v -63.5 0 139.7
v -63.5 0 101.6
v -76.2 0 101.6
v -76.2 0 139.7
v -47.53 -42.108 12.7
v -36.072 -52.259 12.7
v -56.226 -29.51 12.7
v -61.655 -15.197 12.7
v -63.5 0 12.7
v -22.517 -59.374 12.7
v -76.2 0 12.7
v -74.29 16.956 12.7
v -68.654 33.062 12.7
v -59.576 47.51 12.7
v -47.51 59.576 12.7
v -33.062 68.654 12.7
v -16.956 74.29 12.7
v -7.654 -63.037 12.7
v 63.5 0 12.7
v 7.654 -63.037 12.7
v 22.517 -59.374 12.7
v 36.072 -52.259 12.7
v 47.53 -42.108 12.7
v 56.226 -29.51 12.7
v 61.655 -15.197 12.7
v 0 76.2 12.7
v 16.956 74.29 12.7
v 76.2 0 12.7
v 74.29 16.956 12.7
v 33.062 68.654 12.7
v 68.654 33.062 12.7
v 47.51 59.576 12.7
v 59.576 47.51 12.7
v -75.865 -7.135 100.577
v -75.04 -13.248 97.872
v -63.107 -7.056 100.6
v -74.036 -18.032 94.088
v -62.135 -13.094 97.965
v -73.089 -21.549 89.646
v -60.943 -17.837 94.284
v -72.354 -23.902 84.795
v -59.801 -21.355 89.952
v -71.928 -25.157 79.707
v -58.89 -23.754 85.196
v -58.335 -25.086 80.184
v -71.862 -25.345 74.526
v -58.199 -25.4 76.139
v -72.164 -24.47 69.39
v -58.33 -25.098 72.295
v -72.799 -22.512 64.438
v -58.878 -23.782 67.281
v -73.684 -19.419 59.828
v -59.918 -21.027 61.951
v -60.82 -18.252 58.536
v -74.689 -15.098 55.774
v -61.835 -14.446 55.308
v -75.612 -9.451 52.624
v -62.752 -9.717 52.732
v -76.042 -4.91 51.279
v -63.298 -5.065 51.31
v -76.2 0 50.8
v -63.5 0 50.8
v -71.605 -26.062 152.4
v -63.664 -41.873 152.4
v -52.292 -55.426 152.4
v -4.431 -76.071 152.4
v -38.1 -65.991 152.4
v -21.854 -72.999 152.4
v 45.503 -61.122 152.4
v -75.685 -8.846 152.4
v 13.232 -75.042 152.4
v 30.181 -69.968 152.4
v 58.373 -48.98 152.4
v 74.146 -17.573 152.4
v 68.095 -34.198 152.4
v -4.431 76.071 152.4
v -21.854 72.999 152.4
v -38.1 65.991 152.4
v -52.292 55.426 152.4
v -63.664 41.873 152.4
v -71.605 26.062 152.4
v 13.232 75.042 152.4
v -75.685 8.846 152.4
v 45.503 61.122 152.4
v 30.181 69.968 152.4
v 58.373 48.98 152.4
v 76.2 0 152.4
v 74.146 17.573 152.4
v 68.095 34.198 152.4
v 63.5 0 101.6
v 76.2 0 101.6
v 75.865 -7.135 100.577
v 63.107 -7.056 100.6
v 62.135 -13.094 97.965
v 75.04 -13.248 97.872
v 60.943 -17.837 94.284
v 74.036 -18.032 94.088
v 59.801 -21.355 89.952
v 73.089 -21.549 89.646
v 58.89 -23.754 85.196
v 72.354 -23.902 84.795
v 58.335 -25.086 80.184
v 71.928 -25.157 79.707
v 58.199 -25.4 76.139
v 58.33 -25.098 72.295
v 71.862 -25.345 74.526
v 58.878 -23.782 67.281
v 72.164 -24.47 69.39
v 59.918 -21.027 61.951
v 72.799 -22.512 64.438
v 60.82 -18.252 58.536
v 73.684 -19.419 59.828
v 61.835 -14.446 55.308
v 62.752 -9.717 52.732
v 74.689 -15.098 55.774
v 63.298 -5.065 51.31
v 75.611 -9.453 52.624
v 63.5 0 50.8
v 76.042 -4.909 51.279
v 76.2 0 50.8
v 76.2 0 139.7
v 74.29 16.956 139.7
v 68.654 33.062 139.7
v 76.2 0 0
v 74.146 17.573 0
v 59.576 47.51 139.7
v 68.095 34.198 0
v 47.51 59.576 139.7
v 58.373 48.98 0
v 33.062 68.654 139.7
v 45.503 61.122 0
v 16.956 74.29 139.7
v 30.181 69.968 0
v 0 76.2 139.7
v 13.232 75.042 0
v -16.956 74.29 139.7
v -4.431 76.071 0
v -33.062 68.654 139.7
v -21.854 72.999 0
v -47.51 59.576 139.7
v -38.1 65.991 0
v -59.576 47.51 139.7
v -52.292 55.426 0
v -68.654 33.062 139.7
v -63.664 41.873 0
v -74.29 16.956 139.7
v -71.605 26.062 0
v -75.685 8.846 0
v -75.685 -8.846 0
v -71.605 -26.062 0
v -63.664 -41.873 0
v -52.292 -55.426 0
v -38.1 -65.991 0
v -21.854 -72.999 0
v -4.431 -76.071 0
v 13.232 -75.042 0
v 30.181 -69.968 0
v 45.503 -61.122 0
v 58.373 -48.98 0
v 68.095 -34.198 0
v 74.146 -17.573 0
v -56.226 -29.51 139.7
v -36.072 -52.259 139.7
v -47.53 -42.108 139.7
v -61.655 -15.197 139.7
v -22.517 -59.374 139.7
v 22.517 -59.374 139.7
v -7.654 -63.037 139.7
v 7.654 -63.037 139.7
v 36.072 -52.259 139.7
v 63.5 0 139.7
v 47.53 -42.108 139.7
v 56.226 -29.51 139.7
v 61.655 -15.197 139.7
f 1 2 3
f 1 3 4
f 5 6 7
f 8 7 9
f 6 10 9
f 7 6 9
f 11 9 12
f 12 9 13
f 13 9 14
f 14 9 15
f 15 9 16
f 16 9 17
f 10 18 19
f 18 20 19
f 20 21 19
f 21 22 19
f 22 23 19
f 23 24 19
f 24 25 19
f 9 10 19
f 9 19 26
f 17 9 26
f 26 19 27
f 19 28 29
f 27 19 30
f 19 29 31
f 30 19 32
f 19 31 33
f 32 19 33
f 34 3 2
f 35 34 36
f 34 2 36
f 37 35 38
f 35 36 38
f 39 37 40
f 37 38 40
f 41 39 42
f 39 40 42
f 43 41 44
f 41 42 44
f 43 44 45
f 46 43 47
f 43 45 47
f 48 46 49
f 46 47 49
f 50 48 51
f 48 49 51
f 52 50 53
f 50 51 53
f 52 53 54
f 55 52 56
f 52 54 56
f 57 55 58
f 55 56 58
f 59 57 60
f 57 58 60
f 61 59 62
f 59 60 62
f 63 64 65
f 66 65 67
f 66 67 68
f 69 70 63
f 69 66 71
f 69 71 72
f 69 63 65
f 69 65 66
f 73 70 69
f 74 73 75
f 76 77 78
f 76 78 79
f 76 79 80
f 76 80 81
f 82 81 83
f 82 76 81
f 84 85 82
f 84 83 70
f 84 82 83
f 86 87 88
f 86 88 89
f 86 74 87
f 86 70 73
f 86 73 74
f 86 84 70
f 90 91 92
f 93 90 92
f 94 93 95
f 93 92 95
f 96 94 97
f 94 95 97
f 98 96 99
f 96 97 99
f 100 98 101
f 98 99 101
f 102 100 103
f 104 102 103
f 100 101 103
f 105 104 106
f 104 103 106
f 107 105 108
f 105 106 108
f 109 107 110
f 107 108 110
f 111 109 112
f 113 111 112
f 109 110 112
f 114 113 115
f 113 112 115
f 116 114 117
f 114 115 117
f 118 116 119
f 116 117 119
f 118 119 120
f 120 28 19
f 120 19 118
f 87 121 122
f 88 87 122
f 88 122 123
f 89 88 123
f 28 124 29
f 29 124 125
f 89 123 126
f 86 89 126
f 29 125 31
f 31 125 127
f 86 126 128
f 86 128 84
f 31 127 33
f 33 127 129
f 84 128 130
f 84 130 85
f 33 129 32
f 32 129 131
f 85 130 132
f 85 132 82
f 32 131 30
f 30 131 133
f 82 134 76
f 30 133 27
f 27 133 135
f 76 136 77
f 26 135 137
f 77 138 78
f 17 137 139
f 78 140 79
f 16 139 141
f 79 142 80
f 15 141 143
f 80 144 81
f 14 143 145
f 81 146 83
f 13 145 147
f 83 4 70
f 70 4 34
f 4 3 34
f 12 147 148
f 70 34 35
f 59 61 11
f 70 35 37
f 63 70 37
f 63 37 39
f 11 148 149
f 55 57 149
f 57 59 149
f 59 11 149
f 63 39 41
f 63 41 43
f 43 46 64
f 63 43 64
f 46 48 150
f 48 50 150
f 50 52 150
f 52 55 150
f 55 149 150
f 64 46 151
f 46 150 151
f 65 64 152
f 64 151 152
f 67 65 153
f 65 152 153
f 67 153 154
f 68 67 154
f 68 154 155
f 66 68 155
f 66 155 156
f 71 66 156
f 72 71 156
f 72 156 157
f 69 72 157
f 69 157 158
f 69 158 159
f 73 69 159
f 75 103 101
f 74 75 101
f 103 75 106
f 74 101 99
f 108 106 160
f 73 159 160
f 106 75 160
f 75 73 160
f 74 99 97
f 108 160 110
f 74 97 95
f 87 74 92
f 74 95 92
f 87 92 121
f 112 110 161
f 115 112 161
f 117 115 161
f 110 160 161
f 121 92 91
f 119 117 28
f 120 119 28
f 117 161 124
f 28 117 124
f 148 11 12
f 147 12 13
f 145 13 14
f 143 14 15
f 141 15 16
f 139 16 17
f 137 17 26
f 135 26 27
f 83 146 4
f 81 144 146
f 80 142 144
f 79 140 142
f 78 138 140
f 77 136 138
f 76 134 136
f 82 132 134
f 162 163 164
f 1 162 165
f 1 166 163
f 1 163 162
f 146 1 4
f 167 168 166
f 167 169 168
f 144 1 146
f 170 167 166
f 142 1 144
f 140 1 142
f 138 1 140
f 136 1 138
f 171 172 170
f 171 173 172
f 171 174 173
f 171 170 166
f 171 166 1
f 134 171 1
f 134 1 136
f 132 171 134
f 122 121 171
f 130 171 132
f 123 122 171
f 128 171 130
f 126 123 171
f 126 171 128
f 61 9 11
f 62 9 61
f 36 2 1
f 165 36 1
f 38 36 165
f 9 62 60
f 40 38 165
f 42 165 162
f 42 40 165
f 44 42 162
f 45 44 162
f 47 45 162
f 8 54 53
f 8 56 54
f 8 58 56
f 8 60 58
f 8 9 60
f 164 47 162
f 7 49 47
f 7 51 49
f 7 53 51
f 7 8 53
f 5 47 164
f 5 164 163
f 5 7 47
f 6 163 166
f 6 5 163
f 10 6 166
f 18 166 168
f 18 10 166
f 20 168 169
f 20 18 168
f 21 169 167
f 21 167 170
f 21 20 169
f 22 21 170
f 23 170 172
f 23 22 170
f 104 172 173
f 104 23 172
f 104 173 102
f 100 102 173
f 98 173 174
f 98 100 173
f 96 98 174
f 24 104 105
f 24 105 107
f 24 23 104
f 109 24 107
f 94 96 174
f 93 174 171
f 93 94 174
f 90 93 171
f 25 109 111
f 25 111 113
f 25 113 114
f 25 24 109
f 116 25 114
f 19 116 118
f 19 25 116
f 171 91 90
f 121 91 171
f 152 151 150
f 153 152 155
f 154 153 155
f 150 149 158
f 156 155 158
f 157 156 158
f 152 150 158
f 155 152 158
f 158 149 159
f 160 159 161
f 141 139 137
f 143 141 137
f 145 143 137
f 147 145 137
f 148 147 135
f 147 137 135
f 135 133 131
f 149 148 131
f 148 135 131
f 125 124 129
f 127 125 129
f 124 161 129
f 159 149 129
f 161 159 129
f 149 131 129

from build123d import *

# Parameters (mm, degrees)
F0_R     = 76.2
F1_DEPTH = 152.4
F2_W     = 76.771498
F2_H     = 127
F3_DEPTH = 76.2
F4_R     = 63.5
F5_DEPTH = 127
F6_R     = 25.4
F7_DEPTH = 76.2


with BuildPart() as f1:
    # F0 (on Top) → F1 (new body)
    with BuildSketch(Plane.XY):
        Circle(F0_R)
    extrude(amount=F1_DEPTH)

    # F2 (on Right) → F3 (cut, symmetric)
    with BuildSketch(Plane.YZ):
        with Locations((38.385749, 76.2)):
            Rectangle(F2_W, F2_H)
    extrude(amount=F3_DEPTH, both=True, mode=Mode.SUBTRACT)

    # F4 (on face) → F5 (cut)
    with BuildSketch(Plane.XY.offset(12.7)):
        Circle(F4_R)
    extrude(amount=F5_DEPTH, mode=Mode.SUBTRACT)

    # F6 (on Right) → F7 (cut, symmetric)
    with BuildSketch(Plane.YZ):
        with Locations((0, 76.2)):
            Circle(F6_R)
    extrude(amount=F7_DEPTH, both=True, mode=Mode.SUBTRACT)


solid = f1.part
